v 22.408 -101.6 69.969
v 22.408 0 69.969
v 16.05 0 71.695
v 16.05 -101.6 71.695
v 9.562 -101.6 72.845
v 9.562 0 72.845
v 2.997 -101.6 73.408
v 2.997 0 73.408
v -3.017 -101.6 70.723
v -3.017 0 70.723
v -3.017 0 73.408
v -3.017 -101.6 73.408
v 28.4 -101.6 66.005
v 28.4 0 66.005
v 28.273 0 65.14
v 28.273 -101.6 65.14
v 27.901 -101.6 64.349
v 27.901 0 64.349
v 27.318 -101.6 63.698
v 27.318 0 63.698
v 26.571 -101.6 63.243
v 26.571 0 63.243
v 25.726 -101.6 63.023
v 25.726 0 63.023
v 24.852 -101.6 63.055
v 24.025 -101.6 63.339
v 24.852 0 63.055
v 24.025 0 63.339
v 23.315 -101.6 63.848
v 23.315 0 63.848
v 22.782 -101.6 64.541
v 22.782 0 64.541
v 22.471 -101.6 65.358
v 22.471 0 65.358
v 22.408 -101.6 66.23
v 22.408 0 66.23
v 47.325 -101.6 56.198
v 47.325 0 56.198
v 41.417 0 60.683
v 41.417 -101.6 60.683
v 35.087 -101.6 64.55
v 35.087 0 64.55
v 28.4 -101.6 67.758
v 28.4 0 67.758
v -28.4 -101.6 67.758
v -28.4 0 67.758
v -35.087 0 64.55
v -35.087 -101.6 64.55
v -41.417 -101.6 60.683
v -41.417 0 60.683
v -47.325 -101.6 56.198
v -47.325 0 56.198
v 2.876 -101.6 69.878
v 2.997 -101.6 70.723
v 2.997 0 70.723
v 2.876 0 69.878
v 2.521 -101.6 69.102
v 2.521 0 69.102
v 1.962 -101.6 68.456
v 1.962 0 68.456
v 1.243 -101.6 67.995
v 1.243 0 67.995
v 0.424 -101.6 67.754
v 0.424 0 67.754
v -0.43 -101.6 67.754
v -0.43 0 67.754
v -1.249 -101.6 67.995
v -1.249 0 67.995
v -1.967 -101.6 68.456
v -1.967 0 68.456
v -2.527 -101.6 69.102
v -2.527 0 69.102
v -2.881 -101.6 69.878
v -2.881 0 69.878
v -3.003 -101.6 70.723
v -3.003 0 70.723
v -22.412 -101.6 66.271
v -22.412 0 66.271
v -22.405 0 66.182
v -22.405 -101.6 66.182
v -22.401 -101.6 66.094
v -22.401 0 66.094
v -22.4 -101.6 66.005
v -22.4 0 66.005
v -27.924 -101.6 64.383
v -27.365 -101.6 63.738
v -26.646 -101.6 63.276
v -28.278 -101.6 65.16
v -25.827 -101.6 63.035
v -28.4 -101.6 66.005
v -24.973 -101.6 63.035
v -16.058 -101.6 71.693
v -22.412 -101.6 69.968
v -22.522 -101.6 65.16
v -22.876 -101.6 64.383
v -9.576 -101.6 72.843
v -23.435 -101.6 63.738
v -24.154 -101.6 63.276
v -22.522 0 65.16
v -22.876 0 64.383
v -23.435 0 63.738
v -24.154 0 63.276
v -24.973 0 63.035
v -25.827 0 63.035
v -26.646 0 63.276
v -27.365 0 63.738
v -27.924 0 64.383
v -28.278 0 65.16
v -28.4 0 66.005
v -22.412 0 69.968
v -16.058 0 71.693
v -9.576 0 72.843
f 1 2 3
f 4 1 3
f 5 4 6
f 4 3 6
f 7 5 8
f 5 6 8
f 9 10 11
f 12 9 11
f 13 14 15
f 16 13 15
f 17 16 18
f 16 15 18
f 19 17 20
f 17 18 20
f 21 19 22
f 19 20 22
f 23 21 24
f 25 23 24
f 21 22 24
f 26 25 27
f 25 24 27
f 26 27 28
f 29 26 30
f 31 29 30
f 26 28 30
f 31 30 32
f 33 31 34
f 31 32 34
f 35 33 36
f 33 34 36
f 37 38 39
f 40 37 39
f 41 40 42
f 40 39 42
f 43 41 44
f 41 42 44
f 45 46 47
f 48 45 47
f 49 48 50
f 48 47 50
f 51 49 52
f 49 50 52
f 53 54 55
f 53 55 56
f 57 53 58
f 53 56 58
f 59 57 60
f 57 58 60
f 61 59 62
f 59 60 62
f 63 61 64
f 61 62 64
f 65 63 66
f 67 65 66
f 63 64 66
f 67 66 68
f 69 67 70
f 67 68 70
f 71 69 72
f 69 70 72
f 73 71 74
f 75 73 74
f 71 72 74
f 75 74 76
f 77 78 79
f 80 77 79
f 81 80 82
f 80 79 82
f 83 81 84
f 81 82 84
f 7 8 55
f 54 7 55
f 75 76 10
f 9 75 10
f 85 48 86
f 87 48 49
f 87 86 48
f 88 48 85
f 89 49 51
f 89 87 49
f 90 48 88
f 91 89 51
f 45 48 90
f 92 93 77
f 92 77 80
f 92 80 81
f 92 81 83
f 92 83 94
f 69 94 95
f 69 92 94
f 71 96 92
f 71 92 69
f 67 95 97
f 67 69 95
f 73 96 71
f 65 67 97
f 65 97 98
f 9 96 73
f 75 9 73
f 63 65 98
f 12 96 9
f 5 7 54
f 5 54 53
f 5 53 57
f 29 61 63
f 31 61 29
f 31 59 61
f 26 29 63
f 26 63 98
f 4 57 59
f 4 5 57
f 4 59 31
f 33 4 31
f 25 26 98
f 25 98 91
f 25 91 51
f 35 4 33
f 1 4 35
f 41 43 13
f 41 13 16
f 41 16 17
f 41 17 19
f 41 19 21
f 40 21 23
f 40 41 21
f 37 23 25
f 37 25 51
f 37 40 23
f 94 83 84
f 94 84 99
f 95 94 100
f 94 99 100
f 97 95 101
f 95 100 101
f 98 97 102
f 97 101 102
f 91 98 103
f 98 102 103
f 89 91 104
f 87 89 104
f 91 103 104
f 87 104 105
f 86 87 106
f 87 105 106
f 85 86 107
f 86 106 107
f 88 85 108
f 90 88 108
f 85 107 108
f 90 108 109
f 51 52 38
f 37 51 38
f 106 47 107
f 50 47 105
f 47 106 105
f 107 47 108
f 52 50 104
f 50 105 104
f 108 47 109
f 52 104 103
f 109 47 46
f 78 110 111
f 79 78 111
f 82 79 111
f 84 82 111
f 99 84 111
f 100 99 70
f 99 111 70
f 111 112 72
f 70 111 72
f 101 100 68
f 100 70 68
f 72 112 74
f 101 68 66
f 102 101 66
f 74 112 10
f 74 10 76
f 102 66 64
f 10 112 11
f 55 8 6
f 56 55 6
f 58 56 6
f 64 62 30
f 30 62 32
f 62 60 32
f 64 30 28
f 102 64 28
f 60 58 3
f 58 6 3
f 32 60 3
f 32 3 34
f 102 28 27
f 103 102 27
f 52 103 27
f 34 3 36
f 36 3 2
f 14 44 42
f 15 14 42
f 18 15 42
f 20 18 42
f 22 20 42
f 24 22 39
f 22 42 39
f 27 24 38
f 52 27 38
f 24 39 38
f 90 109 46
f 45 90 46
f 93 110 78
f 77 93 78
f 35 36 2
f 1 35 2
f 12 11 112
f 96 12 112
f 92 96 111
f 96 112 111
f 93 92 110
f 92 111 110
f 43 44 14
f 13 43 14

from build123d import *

# Parameters (mm, degrees)
F1_DEPTH = 101.6


with BuildPart() as f1:
    # F0 (on Front) → F1 (new body)
    with BuildSketch(Plane.XZ):
        with BuildLine():
            Line((-47.3245013075, 56.1975), (47.3245013075, 56.1975))
            ThreePointArc((47.3245013075, 56.1975), (38.3009648813, 62.6961204495), (28.4, 67.7584491429))
            Line((28.4, 67.7584491429), (28.4, 66.0049502102))
            ThreePointArc((28.4, 66.0049502102), (25.2876310607, 63.0070554119), (22.4084178523, 66.2295303826))
            Line((22.4084178523, 66.2295303826), (22.4084178523, 69.9687804639))
            ThreePointArc((22.4084178523, 69.9687804639), (12.8187011015, 72.3425762074), (2.997208132, 73.408338584))
            Line((2.997208132, 73.408338584), (2.997208132, 70.7234999449))
            ThreePointArc((2.997208132, 70.7234999449), (-0.002791868, 67.7234999449), (-3.002791868, 70.7234999449))
            Line((-3.002791868, 70.7234999449), (-3.0169040135, 70.7234999449))
            Line((-3.0169040135, 70.7234999449), (-3.0169040135, 73.407531769))
            ThreePointArc((-3.0169040135, 73.407531769), (-12.8301586499, 72.3405450579), (-22.4118081837, 69.9676945753))
            Line((-22.4118081837, 69.9676945753), (-22.4118081837, 66.2708631072))
            ThreePointArc((-22.4118081837, 66.2708631072), (-22.4029534998, 66.1380376833), (-22.4, 66.0049502102))
            ThreePointArc((-22.4, 66.0049502102), (-25.4, 63.0049502102), (-28.4, 66.0049502102))
            Line((-28.4, 66.0049502102), (-28.4, 67.7584491429))
            ThreePointArc((-28.4, 67.7584491429), (-38.3009648813, 62.6961204495), (-47.3245013075, 56.1975))
        make_face()
    extrude(amount=F1_DEPTH)


solid = f1.part
